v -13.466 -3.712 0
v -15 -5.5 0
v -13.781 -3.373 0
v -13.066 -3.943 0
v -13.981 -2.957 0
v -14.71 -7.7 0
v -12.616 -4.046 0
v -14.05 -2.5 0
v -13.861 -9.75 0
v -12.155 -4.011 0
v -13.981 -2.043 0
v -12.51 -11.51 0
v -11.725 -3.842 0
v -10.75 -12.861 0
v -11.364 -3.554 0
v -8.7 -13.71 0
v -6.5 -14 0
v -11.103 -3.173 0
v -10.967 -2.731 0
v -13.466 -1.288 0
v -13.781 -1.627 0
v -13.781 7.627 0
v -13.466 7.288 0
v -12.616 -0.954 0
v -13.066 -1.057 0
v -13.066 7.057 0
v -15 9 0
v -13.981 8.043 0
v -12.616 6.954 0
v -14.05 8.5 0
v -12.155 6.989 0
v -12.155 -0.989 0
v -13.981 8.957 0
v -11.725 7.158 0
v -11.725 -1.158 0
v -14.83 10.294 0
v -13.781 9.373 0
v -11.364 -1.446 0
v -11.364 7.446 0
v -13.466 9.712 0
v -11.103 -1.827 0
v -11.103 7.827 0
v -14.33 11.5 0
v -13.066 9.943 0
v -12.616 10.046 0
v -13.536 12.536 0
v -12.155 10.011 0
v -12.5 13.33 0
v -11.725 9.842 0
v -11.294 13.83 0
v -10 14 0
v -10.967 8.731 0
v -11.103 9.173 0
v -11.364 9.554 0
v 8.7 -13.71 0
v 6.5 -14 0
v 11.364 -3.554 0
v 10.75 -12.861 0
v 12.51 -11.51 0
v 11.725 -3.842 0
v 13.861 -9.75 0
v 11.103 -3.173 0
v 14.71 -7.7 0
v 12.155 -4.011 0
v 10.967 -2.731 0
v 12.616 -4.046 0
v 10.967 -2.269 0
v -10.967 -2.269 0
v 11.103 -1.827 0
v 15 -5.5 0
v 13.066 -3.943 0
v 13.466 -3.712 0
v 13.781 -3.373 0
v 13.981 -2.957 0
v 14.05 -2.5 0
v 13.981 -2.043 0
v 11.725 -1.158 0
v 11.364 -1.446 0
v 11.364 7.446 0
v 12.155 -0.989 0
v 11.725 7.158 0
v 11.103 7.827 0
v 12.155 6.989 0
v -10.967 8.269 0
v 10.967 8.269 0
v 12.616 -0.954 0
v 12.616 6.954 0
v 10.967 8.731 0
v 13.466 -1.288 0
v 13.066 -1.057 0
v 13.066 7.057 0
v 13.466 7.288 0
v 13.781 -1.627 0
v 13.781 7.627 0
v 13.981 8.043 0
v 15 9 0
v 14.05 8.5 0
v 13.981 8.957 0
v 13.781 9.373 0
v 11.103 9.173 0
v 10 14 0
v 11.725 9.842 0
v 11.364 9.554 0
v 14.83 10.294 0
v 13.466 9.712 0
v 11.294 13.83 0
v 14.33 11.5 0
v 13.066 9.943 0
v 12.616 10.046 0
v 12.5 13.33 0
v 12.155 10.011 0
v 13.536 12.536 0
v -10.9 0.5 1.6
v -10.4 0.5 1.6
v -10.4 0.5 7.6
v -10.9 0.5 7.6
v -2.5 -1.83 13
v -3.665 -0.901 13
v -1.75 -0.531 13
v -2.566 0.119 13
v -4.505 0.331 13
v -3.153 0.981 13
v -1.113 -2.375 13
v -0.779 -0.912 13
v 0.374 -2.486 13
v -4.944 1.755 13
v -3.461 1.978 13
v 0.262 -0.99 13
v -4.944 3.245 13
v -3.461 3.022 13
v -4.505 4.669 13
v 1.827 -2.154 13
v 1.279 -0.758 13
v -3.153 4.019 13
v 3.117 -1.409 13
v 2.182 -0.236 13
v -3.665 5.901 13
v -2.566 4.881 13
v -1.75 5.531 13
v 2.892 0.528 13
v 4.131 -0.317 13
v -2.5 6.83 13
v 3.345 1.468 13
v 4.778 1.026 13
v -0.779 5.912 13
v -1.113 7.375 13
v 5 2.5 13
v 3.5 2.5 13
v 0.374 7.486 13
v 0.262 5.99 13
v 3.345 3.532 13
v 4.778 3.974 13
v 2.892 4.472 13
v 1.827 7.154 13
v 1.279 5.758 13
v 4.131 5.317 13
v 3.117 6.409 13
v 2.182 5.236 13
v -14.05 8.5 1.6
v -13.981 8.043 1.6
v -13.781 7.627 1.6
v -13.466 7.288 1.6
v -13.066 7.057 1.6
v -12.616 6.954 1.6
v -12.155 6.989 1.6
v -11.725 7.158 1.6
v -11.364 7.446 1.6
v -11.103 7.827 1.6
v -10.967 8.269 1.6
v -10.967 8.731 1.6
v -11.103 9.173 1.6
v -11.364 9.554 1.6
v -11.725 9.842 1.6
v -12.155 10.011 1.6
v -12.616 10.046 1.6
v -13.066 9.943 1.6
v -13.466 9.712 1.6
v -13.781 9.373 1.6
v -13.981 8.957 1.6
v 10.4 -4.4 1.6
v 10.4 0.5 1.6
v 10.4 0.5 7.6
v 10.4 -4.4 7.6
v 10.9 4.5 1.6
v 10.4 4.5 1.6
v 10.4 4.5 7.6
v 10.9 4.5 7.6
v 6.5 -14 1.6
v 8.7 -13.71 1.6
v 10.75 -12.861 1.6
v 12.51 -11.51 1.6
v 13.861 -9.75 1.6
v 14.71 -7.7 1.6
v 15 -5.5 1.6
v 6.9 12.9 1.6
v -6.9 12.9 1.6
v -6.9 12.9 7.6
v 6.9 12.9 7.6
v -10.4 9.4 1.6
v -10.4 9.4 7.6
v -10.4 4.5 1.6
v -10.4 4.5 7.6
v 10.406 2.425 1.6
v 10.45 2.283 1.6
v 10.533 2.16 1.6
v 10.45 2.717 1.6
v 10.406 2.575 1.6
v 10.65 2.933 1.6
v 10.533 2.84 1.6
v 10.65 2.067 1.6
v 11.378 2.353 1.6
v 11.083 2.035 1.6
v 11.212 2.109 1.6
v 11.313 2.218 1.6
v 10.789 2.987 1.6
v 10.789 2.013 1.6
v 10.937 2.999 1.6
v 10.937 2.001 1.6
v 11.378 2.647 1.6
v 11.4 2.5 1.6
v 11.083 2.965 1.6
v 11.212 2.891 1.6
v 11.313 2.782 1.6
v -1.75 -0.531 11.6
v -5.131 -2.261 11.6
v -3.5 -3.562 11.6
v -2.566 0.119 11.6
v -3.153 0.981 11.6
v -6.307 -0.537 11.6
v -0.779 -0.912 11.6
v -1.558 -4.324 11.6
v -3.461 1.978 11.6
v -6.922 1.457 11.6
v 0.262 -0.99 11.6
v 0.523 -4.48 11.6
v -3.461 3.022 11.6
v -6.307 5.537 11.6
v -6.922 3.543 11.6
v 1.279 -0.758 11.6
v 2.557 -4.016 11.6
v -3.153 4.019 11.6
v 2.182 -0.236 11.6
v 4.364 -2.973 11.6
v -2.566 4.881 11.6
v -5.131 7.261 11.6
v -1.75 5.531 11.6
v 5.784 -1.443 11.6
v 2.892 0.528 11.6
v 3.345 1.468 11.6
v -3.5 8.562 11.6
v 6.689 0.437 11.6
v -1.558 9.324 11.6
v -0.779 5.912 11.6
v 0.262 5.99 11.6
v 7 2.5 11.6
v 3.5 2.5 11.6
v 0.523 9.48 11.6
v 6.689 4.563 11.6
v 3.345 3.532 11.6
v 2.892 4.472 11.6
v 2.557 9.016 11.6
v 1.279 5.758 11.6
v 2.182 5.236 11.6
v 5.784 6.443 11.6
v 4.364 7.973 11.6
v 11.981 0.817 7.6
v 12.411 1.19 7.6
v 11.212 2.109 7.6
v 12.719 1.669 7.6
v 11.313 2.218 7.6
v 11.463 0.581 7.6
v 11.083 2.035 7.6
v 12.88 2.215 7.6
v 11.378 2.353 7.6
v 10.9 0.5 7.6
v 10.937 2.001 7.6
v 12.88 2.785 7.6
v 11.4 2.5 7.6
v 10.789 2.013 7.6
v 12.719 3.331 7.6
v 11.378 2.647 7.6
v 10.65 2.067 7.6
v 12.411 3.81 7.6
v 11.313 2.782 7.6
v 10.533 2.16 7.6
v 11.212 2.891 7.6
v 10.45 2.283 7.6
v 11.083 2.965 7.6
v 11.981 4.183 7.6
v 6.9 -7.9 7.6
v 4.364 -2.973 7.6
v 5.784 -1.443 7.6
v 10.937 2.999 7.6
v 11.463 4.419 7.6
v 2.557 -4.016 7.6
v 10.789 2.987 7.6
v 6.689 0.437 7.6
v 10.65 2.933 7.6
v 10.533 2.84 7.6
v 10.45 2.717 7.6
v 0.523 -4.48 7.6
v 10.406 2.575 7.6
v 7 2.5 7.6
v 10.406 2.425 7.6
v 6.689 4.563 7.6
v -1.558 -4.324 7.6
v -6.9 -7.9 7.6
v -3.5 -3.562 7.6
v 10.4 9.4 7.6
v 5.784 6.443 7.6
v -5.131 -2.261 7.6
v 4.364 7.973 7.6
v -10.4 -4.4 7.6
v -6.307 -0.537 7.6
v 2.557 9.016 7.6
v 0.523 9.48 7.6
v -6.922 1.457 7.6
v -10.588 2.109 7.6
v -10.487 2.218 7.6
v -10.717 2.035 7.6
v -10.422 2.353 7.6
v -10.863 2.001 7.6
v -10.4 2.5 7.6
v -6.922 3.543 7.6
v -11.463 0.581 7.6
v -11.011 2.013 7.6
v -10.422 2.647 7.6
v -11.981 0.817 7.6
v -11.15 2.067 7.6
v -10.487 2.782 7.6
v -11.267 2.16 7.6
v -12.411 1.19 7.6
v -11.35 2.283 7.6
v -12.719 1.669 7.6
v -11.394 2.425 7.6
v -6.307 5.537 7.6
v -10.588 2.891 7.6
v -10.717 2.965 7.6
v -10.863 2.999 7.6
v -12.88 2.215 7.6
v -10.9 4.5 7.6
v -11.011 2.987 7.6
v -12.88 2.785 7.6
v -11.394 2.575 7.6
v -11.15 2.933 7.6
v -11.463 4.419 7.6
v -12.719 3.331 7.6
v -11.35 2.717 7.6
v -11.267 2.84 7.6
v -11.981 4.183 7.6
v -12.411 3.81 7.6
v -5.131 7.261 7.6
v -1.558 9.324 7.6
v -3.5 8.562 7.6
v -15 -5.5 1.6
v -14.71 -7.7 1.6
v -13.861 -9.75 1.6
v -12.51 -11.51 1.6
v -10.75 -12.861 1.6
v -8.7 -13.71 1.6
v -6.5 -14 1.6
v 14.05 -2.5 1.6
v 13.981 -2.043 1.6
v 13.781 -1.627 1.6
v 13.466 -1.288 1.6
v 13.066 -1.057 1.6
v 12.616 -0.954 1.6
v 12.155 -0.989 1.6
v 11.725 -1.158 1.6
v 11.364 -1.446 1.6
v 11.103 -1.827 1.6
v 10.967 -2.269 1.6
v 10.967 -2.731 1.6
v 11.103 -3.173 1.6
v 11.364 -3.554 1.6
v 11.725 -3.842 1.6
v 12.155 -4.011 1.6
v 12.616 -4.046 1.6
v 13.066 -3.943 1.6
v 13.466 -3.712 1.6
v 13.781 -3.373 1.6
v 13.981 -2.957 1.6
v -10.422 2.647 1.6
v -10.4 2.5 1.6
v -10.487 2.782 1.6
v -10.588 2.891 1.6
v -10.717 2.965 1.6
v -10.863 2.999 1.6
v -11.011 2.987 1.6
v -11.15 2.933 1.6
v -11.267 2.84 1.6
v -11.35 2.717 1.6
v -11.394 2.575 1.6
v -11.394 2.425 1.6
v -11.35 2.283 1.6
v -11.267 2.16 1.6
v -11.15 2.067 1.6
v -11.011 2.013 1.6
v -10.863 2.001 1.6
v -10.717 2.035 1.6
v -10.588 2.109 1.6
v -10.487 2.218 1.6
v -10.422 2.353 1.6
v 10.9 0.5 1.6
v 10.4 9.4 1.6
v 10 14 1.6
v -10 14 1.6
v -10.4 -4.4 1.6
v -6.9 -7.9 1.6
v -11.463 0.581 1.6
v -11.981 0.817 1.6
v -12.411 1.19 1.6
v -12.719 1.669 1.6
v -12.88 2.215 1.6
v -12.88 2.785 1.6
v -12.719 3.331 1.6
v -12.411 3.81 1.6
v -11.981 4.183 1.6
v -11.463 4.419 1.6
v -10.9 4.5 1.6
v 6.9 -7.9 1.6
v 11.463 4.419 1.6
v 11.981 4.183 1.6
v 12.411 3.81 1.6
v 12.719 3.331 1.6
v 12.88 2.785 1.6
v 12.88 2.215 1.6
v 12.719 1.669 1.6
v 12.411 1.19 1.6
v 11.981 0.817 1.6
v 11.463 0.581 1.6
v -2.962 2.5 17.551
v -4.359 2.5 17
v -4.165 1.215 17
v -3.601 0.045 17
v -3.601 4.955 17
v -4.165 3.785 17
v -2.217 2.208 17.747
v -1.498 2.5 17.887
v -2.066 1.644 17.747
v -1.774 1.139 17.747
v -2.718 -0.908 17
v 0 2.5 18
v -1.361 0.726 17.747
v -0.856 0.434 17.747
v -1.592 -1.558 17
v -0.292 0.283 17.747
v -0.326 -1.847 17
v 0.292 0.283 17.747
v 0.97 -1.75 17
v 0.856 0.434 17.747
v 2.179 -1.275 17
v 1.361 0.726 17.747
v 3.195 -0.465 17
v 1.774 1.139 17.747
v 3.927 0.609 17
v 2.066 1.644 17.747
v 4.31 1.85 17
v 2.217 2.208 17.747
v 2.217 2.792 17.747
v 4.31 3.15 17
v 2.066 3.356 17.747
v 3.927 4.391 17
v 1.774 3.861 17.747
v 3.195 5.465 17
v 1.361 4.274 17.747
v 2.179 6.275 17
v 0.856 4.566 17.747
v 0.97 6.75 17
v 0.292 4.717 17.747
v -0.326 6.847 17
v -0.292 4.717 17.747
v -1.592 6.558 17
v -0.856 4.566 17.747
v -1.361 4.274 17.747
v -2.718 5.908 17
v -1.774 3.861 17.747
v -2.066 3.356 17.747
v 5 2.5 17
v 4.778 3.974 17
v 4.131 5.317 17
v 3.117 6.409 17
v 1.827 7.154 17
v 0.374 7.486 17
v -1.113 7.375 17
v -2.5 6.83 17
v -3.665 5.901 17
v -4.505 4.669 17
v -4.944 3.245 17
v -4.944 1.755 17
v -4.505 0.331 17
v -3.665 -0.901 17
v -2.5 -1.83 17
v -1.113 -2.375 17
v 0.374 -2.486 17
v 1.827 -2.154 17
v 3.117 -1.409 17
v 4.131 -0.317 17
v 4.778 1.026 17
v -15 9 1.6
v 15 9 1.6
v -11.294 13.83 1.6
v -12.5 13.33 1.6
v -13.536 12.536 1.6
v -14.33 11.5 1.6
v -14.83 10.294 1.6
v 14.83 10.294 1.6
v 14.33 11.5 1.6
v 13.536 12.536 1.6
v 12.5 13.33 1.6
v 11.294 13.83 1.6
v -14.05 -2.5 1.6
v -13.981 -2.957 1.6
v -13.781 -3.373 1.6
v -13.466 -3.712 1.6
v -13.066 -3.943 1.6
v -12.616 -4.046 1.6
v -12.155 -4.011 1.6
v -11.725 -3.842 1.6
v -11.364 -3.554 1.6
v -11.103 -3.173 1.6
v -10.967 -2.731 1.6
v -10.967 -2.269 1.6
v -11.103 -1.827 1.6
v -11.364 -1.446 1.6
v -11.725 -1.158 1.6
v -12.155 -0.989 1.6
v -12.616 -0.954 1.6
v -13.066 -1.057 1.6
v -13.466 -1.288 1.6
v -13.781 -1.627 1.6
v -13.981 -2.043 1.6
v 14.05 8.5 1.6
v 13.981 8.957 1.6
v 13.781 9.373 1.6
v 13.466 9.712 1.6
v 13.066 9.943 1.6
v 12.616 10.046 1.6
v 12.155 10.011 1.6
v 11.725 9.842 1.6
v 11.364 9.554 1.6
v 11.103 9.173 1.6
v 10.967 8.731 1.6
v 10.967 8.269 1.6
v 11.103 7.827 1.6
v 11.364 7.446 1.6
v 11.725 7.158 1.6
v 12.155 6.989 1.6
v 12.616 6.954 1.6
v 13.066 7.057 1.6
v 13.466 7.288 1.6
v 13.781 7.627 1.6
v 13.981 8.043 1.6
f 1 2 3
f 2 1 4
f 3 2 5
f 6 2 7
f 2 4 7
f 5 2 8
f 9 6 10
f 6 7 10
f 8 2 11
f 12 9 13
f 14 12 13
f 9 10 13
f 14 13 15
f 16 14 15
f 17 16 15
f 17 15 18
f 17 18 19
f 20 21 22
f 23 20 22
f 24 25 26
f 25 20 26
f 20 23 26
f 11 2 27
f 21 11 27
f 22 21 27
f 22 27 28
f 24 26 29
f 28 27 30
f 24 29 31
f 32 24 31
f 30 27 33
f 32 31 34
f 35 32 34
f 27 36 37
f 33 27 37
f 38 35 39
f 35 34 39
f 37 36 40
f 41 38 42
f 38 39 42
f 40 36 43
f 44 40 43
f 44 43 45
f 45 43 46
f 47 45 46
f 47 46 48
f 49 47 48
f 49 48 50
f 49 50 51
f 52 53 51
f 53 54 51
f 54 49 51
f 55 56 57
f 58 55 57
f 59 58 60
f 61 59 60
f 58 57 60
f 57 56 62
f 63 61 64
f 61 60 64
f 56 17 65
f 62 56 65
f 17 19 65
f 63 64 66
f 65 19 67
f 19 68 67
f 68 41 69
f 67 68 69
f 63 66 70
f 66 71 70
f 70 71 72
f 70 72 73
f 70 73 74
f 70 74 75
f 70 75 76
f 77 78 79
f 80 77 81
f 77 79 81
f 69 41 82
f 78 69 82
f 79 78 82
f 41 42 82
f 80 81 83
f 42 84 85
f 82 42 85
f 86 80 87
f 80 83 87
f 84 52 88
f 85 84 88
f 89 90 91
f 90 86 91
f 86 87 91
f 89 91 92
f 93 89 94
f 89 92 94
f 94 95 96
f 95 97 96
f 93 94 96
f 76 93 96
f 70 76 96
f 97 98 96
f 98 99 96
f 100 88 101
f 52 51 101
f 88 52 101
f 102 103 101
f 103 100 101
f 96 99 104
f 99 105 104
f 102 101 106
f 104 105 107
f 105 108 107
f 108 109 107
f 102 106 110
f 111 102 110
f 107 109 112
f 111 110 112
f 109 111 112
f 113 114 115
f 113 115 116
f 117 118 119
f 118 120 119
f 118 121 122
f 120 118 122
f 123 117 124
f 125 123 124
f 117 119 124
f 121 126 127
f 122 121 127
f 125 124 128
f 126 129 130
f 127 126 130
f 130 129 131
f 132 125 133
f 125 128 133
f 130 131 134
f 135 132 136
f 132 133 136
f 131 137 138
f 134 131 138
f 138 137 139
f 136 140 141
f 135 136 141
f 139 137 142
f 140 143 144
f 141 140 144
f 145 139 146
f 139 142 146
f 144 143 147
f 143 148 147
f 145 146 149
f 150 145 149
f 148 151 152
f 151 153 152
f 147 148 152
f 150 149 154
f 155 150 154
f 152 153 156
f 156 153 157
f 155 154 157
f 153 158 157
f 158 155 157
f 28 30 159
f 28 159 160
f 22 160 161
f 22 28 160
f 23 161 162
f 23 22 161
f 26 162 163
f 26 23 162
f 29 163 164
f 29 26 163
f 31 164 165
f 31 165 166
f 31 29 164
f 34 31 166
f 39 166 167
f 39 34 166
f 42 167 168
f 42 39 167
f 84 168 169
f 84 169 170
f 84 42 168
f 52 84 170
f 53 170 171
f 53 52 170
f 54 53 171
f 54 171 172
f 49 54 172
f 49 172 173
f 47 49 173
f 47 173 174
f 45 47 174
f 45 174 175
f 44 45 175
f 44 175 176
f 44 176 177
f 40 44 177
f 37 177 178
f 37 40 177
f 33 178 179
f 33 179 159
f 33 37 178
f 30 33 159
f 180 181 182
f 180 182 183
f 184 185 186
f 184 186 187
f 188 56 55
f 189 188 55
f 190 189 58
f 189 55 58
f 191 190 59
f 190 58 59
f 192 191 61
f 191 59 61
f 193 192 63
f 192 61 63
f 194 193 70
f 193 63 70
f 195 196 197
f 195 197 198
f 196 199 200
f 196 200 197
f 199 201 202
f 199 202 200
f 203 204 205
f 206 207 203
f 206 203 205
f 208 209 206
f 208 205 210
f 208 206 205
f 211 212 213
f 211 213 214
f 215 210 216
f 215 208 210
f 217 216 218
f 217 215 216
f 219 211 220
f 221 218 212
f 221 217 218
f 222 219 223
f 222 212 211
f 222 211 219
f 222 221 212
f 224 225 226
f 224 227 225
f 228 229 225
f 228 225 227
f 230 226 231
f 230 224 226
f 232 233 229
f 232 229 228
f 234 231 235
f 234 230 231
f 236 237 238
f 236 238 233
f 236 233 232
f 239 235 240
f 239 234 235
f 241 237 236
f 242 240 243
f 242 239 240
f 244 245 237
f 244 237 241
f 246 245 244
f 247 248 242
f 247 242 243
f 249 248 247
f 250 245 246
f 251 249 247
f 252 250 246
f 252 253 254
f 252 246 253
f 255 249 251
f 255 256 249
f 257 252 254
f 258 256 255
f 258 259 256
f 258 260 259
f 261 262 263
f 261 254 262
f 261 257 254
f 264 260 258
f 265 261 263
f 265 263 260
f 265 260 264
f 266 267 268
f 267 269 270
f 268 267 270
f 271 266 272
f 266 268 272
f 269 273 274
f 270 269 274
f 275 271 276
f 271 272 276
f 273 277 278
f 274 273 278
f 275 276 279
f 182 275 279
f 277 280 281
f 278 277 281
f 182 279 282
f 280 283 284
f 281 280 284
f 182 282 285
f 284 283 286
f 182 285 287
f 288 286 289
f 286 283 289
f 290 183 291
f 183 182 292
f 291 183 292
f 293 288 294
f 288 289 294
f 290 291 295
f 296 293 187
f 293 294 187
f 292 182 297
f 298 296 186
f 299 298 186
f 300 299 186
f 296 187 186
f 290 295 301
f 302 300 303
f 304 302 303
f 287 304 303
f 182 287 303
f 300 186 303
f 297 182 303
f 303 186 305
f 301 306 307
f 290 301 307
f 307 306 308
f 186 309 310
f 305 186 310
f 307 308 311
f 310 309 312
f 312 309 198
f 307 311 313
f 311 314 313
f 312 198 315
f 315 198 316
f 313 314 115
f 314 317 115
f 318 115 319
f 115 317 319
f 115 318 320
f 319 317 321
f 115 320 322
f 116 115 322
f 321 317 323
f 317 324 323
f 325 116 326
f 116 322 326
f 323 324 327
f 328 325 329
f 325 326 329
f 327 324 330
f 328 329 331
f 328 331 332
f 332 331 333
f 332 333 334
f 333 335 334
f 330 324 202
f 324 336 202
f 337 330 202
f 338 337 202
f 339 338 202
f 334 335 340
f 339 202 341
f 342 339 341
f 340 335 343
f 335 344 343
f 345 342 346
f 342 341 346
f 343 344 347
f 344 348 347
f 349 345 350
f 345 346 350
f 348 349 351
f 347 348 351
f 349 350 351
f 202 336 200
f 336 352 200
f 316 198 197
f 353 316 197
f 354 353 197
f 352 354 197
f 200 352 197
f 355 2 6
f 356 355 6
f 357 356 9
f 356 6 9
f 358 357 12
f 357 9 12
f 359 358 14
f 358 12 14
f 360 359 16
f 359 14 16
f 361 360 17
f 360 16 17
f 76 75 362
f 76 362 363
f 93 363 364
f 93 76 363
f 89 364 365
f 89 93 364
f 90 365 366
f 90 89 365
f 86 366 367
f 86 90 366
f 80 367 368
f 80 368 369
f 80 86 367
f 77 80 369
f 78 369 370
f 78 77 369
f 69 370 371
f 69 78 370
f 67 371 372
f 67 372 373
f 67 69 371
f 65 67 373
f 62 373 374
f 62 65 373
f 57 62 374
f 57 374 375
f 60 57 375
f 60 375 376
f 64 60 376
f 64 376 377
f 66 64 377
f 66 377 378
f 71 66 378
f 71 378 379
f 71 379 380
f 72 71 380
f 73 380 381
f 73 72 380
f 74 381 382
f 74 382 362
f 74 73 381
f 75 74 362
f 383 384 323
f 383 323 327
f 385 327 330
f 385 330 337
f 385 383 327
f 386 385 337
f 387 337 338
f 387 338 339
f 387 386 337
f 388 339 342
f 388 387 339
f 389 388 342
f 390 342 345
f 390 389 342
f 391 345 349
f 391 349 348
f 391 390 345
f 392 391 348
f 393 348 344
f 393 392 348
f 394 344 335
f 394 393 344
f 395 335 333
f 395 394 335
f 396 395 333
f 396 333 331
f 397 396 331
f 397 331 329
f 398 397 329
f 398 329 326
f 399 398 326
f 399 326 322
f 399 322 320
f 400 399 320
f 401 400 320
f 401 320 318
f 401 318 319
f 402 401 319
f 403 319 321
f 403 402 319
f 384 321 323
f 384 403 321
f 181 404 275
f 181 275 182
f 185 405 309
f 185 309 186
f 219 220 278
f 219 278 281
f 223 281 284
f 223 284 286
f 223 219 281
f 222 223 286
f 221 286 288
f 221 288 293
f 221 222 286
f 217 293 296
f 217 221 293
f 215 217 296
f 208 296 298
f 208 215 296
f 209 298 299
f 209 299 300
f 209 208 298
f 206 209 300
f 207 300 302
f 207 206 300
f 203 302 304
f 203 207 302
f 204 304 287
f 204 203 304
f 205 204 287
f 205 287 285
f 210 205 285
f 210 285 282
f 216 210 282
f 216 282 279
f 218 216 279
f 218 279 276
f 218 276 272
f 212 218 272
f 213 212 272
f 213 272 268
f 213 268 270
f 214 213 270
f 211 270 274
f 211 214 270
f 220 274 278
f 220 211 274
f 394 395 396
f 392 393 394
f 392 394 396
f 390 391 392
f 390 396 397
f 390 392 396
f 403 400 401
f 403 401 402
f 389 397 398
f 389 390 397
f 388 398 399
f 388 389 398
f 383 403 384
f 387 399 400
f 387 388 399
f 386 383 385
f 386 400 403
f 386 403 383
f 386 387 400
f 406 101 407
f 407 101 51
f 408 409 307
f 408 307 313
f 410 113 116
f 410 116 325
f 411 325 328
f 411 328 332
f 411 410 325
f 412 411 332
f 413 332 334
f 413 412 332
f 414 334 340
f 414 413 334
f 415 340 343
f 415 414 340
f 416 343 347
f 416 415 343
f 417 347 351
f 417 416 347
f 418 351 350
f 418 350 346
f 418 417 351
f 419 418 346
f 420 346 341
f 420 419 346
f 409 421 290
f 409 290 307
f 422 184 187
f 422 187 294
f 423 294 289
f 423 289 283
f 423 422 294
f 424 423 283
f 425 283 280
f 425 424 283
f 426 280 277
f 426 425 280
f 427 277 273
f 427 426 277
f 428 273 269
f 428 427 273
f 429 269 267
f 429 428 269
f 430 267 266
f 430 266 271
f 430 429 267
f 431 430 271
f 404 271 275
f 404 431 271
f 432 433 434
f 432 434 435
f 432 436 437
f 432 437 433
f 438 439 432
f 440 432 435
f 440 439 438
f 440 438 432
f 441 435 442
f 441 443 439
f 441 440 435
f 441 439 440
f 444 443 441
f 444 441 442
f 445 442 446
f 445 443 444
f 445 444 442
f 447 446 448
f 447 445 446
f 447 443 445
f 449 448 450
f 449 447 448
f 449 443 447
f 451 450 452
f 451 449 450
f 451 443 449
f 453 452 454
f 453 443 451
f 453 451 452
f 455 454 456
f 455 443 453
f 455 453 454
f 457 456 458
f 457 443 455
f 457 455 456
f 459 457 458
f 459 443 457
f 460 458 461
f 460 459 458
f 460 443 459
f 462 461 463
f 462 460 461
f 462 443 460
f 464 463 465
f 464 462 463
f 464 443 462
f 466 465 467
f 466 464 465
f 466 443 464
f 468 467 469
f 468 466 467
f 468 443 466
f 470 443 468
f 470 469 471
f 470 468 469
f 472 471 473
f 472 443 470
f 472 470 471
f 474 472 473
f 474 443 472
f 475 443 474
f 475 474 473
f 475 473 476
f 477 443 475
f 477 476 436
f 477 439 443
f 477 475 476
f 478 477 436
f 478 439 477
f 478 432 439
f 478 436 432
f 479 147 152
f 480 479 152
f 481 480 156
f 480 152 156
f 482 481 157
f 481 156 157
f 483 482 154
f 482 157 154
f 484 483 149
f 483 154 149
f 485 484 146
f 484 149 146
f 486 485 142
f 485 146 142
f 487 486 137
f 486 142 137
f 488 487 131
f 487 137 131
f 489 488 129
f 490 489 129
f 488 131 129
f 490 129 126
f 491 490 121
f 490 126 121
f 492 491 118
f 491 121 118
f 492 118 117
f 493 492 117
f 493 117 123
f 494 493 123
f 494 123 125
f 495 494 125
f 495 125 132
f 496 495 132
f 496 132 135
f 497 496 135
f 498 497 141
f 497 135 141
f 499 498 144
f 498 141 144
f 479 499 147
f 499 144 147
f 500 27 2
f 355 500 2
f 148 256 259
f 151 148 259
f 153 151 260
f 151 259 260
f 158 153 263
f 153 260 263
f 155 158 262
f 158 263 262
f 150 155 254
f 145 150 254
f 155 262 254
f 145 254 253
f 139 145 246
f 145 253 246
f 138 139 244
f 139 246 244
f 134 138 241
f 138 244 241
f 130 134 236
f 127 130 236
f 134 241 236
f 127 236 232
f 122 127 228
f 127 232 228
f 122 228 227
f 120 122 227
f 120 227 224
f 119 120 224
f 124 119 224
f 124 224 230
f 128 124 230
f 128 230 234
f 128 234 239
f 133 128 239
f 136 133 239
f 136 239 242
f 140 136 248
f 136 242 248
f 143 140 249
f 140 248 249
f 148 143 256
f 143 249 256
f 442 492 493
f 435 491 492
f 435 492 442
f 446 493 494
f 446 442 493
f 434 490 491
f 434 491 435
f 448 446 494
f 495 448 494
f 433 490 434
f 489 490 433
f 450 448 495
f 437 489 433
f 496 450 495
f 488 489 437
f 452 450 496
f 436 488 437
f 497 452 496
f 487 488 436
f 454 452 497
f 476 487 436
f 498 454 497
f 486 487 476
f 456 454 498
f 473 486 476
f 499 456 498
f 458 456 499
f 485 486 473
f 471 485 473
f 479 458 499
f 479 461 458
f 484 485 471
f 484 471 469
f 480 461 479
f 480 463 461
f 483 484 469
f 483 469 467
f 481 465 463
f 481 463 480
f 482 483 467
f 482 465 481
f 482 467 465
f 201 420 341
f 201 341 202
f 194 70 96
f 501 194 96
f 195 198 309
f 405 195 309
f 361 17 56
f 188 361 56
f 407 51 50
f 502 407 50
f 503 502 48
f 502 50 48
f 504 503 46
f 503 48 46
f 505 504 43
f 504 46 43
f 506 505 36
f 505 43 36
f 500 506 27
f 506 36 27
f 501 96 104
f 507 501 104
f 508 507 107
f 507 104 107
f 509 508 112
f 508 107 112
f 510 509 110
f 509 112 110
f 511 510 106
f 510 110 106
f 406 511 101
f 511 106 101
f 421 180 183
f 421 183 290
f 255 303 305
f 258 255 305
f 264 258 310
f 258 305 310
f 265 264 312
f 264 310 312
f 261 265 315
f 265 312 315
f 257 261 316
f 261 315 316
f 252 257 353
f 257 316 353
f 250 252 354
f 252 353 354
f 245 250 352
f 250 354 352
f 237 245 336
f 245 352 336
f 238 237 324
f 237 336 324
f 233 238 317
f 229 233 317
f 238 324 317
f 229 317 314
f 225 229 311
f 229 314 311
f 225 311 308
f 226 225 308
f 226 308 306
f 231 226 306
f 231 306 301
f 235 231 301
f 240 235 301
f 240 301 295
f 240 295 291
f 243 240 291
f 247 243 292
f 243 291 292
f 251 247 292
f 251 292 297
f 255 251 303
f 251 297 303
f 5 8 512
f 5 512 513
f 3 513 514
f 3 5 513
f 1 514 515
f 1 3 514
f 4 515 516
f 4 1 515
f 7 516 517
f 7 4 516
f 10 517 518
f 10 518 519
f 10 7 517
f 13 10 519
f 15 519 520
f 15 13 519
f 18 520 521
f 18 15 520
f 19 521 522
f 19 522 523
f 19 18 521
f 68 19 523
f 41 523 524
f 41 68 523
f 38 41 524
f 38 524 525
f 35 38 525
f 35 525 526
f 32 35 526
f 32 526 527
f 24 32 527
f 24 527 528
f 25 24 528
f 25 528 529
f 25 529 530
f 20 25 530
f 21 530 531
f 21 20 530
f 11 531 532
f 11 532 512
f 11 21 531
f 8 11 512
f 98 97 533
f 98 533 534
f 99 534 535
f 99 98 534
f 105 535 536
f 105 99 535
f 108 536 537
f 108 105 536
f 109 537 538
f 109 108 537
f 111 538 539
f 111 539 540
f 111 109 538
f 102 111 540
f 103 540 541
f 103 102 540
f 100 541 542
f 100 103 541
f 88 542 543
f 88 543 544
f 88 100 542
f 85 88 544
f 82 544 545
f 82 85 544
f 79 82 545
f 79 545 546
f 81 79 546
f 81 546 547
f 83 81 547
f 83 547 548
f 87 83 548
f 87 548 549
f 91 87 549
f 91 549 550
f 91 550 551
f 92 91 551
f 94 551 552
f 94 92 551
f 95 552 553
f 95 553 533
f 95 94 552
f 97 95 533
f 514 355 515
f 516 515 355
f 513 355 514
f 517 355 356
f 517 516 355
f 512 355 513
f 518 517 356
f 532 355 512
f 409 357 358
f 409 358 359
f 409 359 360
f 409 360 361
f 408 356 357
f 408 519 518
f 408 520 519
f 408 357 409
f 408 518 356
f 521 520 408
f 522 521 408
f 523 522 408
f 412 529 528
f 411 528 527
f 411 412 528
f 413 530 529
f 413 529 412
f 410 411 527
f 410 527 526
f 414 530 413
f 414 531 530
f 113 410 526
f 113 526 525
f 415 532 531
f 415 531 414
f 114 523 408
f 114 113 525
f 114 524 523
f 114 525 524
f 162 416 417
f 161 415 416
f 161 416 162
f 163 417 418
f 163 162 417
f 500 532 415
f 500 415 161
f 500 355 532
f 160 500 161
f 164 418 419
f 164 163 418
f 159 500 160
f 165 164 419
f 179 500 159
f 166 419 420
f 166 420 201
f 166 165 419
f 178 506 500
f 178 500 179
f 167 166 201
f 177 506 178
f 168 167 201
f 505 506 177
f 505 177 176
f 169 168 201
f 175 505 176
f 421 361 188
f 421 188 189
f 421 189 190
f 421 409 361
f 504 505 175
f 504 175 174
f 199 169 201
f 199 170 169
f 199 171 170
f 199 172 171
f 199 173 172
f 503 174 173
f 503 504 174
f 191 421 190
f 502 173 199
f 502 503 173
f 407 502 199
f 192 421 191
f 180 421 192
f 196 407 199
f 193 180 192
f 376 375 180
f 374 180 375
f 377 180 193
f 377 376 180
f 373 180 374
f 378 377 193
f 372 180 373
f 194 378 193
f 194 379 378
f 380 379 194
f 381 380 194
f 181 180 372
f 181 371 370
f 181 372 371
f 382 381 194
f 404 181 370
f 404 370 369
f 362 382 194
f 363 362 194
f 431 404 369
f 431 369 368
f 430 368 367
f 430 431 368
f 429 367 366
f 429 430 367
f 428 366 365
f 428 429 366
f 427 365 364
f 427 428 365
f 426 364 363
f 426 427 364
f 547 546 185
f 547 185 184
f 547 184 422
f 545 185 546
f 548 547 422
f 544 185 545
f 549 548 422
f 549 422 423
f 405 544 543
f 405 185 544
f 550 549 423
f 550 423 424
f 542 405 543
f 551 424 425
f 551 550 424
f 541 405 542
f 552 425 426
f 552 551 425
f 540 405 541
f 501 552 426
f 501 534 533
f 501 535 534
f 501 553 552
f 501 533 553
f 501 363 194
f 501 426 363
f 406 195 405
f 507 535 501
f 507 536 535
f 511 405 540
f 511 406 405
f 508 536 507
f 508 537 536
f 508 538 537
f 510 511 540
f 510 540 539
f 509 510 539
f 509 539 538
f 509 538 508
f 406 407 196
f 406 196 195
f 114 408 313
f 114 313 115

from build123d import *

# Parameters (mm, degrees)
SKETCH_3_R      = 1.55
EXTRUDE_1_DEPTH = 1.6
SKETCH_4_R      = 0.5
EXTRUDE_2_DEPTH = 6
SKETCH_5_R      = 7
EXTRUDE_3_DEPTH = 4
SKETCH_6_R      = 3.5
EXTRUDE_4_DEPTH = 1.4
SKETCH_7_R      = 5
EXTRUDE_5_DEPTH = 4


with BuildPart() as part:
    # 草图3 → 凸台-拉伸1 (new body)
    with BuildSketch(Plane.XY):
        with BuildLine():
            Line((-6.5, -14), (6.5, -14))
            ThreePointArc((6.5, -14), (12.51040764, -11.51040764), (15, -5.5))
            Line((15, -5.5), (15, 9))
            ThreePointArc((15, 9), (13.535533906, 12.535533906), (10, 14))
            Line((10, 14), (-10, 14))
            ThreePointArc((-10, 14), (-13.535533906, 12.535533906), (-15, 9))
            Line((-15, 9), (-15, -5.5))
            ThreePointArc((-15, -5.5), (-12.51040764, -11.51040764), (-6.5, -14))
        make_face()
        with Locations((12.5, 8.5)):
            Circle(SKETCH_3_R, mode=Mode.SUBTRACT)
        with Locations((12.5, -2.5)):
            Circle(SKETCH_3_R, mode=Mode.SUBTRACT)
        with Locations(Location((-12.5, -2.5, 0), (0, 0, 180))):
            Circle(SKETCH_3_R, mode=Mode.SUBTRACT)
        with Locations(Location((-12.5, 8.5, 0), (0, 0, 180))):
            Circle(SKETCH_3_R, mode=Mode.SUBTRACT)
    extrude(amount=EXTRUDE_1_DEPTH)

    # 草图4 → 凸台-拉伸2 (add)
    with BuildSketch(Plane.XY.offset(1.6)):
        with BuildLine():
            Line((-10.4, 9.4), (-6.9, 12.9))
            Line((-6.9, 12.9), (6.9, 12.9))
            Line((6.9, 12.9), (10.4, 9.4))
            Line((10.4, 9.4), (10.4, 4.5))
            Line((10.4, 4.5), (10.9, 4.5))
            ThreePointArc((10.9, 4.5), (12.9, 2.5), (10.9, 0.5))
            Line((10.9, 0.5), (10.4, 0.5))
            Line((10.4, 0.5), (10.4, -4.4))
            Line((10.4, -4.4), (6.9, -7.9))
            Line((6.9, -7.9), (-6.9, -7.9))
            Line((-6.9, -7.9), (-10.4, -4.4))
            Line((-10.4, -4.4), (-10.4, 0.5))
            Line((-10.4, 0.5), (-10.9, 0.5))
            ThreePointArc((-10.9, 0.5), (-12.9, 2.5), (-10.9, 4.5))
            Line((-10.9, 4.5), (-10.4, 4.5))
            Line((-10.4, 4.5), (-10.4, 9.4))
        make_face()
        with Locations((10.9, 2.5)):
            Circle(SKETCH_4_R, mode=Mode.SUBTRACT)
        with Locations((-10.9, 2.5)):
            Circle(SKETCH_4_R, mode=Mode.SUBTRACT)
    extrude(amount=EXTRUDE_2_DEPTH)

    # 草图5 → 凸台-拉伸3 (add)
    with BuildSketch(Plane.XY.offset(7.6)):
        with Locations((0, 2.5)):
            Circle(SKETCH_5_R)
    extrude(amount=EXTRUDE_3_DEPTH)

    # 草图6 → 凸台-拉伸4 (add)
    with BuildSketch(Plane.XY.offset(11.6)):
        with Locations((0, 2.5)):
            Circle(SKETCH_6_R)
    extrude(amount=EXTRUDE_4_DEPTH)

    # 草图7 → 凸台-拉伸5 (add)
    with BuildSketch(Plane.XY.offset(13)):
        with Locations((0, 2.5)):
            Circle(SKETCH_7_R)
    extrude(amount=EXTRUDE_5_DEPTH)

    # 草图8 → 旋转1 (revolve)
    with BuildSketch(Plane(origin=(0, 2.5, 0), x_dir=(1, 0, 0), z_dir=(0, 1, 0))):
        with BuildLine():
            Line((0, -17), (-4.358898944, -17))
            ThreePointArc((-4.358898944, -17), (-2.236067977, -17.746794345), (0, -18))
            Line((0, -18), (0, -17))
        make_face()
    revolve(axis=Axis((0, 2.5, 17), (0, 0, 1)))


solid = part.part
